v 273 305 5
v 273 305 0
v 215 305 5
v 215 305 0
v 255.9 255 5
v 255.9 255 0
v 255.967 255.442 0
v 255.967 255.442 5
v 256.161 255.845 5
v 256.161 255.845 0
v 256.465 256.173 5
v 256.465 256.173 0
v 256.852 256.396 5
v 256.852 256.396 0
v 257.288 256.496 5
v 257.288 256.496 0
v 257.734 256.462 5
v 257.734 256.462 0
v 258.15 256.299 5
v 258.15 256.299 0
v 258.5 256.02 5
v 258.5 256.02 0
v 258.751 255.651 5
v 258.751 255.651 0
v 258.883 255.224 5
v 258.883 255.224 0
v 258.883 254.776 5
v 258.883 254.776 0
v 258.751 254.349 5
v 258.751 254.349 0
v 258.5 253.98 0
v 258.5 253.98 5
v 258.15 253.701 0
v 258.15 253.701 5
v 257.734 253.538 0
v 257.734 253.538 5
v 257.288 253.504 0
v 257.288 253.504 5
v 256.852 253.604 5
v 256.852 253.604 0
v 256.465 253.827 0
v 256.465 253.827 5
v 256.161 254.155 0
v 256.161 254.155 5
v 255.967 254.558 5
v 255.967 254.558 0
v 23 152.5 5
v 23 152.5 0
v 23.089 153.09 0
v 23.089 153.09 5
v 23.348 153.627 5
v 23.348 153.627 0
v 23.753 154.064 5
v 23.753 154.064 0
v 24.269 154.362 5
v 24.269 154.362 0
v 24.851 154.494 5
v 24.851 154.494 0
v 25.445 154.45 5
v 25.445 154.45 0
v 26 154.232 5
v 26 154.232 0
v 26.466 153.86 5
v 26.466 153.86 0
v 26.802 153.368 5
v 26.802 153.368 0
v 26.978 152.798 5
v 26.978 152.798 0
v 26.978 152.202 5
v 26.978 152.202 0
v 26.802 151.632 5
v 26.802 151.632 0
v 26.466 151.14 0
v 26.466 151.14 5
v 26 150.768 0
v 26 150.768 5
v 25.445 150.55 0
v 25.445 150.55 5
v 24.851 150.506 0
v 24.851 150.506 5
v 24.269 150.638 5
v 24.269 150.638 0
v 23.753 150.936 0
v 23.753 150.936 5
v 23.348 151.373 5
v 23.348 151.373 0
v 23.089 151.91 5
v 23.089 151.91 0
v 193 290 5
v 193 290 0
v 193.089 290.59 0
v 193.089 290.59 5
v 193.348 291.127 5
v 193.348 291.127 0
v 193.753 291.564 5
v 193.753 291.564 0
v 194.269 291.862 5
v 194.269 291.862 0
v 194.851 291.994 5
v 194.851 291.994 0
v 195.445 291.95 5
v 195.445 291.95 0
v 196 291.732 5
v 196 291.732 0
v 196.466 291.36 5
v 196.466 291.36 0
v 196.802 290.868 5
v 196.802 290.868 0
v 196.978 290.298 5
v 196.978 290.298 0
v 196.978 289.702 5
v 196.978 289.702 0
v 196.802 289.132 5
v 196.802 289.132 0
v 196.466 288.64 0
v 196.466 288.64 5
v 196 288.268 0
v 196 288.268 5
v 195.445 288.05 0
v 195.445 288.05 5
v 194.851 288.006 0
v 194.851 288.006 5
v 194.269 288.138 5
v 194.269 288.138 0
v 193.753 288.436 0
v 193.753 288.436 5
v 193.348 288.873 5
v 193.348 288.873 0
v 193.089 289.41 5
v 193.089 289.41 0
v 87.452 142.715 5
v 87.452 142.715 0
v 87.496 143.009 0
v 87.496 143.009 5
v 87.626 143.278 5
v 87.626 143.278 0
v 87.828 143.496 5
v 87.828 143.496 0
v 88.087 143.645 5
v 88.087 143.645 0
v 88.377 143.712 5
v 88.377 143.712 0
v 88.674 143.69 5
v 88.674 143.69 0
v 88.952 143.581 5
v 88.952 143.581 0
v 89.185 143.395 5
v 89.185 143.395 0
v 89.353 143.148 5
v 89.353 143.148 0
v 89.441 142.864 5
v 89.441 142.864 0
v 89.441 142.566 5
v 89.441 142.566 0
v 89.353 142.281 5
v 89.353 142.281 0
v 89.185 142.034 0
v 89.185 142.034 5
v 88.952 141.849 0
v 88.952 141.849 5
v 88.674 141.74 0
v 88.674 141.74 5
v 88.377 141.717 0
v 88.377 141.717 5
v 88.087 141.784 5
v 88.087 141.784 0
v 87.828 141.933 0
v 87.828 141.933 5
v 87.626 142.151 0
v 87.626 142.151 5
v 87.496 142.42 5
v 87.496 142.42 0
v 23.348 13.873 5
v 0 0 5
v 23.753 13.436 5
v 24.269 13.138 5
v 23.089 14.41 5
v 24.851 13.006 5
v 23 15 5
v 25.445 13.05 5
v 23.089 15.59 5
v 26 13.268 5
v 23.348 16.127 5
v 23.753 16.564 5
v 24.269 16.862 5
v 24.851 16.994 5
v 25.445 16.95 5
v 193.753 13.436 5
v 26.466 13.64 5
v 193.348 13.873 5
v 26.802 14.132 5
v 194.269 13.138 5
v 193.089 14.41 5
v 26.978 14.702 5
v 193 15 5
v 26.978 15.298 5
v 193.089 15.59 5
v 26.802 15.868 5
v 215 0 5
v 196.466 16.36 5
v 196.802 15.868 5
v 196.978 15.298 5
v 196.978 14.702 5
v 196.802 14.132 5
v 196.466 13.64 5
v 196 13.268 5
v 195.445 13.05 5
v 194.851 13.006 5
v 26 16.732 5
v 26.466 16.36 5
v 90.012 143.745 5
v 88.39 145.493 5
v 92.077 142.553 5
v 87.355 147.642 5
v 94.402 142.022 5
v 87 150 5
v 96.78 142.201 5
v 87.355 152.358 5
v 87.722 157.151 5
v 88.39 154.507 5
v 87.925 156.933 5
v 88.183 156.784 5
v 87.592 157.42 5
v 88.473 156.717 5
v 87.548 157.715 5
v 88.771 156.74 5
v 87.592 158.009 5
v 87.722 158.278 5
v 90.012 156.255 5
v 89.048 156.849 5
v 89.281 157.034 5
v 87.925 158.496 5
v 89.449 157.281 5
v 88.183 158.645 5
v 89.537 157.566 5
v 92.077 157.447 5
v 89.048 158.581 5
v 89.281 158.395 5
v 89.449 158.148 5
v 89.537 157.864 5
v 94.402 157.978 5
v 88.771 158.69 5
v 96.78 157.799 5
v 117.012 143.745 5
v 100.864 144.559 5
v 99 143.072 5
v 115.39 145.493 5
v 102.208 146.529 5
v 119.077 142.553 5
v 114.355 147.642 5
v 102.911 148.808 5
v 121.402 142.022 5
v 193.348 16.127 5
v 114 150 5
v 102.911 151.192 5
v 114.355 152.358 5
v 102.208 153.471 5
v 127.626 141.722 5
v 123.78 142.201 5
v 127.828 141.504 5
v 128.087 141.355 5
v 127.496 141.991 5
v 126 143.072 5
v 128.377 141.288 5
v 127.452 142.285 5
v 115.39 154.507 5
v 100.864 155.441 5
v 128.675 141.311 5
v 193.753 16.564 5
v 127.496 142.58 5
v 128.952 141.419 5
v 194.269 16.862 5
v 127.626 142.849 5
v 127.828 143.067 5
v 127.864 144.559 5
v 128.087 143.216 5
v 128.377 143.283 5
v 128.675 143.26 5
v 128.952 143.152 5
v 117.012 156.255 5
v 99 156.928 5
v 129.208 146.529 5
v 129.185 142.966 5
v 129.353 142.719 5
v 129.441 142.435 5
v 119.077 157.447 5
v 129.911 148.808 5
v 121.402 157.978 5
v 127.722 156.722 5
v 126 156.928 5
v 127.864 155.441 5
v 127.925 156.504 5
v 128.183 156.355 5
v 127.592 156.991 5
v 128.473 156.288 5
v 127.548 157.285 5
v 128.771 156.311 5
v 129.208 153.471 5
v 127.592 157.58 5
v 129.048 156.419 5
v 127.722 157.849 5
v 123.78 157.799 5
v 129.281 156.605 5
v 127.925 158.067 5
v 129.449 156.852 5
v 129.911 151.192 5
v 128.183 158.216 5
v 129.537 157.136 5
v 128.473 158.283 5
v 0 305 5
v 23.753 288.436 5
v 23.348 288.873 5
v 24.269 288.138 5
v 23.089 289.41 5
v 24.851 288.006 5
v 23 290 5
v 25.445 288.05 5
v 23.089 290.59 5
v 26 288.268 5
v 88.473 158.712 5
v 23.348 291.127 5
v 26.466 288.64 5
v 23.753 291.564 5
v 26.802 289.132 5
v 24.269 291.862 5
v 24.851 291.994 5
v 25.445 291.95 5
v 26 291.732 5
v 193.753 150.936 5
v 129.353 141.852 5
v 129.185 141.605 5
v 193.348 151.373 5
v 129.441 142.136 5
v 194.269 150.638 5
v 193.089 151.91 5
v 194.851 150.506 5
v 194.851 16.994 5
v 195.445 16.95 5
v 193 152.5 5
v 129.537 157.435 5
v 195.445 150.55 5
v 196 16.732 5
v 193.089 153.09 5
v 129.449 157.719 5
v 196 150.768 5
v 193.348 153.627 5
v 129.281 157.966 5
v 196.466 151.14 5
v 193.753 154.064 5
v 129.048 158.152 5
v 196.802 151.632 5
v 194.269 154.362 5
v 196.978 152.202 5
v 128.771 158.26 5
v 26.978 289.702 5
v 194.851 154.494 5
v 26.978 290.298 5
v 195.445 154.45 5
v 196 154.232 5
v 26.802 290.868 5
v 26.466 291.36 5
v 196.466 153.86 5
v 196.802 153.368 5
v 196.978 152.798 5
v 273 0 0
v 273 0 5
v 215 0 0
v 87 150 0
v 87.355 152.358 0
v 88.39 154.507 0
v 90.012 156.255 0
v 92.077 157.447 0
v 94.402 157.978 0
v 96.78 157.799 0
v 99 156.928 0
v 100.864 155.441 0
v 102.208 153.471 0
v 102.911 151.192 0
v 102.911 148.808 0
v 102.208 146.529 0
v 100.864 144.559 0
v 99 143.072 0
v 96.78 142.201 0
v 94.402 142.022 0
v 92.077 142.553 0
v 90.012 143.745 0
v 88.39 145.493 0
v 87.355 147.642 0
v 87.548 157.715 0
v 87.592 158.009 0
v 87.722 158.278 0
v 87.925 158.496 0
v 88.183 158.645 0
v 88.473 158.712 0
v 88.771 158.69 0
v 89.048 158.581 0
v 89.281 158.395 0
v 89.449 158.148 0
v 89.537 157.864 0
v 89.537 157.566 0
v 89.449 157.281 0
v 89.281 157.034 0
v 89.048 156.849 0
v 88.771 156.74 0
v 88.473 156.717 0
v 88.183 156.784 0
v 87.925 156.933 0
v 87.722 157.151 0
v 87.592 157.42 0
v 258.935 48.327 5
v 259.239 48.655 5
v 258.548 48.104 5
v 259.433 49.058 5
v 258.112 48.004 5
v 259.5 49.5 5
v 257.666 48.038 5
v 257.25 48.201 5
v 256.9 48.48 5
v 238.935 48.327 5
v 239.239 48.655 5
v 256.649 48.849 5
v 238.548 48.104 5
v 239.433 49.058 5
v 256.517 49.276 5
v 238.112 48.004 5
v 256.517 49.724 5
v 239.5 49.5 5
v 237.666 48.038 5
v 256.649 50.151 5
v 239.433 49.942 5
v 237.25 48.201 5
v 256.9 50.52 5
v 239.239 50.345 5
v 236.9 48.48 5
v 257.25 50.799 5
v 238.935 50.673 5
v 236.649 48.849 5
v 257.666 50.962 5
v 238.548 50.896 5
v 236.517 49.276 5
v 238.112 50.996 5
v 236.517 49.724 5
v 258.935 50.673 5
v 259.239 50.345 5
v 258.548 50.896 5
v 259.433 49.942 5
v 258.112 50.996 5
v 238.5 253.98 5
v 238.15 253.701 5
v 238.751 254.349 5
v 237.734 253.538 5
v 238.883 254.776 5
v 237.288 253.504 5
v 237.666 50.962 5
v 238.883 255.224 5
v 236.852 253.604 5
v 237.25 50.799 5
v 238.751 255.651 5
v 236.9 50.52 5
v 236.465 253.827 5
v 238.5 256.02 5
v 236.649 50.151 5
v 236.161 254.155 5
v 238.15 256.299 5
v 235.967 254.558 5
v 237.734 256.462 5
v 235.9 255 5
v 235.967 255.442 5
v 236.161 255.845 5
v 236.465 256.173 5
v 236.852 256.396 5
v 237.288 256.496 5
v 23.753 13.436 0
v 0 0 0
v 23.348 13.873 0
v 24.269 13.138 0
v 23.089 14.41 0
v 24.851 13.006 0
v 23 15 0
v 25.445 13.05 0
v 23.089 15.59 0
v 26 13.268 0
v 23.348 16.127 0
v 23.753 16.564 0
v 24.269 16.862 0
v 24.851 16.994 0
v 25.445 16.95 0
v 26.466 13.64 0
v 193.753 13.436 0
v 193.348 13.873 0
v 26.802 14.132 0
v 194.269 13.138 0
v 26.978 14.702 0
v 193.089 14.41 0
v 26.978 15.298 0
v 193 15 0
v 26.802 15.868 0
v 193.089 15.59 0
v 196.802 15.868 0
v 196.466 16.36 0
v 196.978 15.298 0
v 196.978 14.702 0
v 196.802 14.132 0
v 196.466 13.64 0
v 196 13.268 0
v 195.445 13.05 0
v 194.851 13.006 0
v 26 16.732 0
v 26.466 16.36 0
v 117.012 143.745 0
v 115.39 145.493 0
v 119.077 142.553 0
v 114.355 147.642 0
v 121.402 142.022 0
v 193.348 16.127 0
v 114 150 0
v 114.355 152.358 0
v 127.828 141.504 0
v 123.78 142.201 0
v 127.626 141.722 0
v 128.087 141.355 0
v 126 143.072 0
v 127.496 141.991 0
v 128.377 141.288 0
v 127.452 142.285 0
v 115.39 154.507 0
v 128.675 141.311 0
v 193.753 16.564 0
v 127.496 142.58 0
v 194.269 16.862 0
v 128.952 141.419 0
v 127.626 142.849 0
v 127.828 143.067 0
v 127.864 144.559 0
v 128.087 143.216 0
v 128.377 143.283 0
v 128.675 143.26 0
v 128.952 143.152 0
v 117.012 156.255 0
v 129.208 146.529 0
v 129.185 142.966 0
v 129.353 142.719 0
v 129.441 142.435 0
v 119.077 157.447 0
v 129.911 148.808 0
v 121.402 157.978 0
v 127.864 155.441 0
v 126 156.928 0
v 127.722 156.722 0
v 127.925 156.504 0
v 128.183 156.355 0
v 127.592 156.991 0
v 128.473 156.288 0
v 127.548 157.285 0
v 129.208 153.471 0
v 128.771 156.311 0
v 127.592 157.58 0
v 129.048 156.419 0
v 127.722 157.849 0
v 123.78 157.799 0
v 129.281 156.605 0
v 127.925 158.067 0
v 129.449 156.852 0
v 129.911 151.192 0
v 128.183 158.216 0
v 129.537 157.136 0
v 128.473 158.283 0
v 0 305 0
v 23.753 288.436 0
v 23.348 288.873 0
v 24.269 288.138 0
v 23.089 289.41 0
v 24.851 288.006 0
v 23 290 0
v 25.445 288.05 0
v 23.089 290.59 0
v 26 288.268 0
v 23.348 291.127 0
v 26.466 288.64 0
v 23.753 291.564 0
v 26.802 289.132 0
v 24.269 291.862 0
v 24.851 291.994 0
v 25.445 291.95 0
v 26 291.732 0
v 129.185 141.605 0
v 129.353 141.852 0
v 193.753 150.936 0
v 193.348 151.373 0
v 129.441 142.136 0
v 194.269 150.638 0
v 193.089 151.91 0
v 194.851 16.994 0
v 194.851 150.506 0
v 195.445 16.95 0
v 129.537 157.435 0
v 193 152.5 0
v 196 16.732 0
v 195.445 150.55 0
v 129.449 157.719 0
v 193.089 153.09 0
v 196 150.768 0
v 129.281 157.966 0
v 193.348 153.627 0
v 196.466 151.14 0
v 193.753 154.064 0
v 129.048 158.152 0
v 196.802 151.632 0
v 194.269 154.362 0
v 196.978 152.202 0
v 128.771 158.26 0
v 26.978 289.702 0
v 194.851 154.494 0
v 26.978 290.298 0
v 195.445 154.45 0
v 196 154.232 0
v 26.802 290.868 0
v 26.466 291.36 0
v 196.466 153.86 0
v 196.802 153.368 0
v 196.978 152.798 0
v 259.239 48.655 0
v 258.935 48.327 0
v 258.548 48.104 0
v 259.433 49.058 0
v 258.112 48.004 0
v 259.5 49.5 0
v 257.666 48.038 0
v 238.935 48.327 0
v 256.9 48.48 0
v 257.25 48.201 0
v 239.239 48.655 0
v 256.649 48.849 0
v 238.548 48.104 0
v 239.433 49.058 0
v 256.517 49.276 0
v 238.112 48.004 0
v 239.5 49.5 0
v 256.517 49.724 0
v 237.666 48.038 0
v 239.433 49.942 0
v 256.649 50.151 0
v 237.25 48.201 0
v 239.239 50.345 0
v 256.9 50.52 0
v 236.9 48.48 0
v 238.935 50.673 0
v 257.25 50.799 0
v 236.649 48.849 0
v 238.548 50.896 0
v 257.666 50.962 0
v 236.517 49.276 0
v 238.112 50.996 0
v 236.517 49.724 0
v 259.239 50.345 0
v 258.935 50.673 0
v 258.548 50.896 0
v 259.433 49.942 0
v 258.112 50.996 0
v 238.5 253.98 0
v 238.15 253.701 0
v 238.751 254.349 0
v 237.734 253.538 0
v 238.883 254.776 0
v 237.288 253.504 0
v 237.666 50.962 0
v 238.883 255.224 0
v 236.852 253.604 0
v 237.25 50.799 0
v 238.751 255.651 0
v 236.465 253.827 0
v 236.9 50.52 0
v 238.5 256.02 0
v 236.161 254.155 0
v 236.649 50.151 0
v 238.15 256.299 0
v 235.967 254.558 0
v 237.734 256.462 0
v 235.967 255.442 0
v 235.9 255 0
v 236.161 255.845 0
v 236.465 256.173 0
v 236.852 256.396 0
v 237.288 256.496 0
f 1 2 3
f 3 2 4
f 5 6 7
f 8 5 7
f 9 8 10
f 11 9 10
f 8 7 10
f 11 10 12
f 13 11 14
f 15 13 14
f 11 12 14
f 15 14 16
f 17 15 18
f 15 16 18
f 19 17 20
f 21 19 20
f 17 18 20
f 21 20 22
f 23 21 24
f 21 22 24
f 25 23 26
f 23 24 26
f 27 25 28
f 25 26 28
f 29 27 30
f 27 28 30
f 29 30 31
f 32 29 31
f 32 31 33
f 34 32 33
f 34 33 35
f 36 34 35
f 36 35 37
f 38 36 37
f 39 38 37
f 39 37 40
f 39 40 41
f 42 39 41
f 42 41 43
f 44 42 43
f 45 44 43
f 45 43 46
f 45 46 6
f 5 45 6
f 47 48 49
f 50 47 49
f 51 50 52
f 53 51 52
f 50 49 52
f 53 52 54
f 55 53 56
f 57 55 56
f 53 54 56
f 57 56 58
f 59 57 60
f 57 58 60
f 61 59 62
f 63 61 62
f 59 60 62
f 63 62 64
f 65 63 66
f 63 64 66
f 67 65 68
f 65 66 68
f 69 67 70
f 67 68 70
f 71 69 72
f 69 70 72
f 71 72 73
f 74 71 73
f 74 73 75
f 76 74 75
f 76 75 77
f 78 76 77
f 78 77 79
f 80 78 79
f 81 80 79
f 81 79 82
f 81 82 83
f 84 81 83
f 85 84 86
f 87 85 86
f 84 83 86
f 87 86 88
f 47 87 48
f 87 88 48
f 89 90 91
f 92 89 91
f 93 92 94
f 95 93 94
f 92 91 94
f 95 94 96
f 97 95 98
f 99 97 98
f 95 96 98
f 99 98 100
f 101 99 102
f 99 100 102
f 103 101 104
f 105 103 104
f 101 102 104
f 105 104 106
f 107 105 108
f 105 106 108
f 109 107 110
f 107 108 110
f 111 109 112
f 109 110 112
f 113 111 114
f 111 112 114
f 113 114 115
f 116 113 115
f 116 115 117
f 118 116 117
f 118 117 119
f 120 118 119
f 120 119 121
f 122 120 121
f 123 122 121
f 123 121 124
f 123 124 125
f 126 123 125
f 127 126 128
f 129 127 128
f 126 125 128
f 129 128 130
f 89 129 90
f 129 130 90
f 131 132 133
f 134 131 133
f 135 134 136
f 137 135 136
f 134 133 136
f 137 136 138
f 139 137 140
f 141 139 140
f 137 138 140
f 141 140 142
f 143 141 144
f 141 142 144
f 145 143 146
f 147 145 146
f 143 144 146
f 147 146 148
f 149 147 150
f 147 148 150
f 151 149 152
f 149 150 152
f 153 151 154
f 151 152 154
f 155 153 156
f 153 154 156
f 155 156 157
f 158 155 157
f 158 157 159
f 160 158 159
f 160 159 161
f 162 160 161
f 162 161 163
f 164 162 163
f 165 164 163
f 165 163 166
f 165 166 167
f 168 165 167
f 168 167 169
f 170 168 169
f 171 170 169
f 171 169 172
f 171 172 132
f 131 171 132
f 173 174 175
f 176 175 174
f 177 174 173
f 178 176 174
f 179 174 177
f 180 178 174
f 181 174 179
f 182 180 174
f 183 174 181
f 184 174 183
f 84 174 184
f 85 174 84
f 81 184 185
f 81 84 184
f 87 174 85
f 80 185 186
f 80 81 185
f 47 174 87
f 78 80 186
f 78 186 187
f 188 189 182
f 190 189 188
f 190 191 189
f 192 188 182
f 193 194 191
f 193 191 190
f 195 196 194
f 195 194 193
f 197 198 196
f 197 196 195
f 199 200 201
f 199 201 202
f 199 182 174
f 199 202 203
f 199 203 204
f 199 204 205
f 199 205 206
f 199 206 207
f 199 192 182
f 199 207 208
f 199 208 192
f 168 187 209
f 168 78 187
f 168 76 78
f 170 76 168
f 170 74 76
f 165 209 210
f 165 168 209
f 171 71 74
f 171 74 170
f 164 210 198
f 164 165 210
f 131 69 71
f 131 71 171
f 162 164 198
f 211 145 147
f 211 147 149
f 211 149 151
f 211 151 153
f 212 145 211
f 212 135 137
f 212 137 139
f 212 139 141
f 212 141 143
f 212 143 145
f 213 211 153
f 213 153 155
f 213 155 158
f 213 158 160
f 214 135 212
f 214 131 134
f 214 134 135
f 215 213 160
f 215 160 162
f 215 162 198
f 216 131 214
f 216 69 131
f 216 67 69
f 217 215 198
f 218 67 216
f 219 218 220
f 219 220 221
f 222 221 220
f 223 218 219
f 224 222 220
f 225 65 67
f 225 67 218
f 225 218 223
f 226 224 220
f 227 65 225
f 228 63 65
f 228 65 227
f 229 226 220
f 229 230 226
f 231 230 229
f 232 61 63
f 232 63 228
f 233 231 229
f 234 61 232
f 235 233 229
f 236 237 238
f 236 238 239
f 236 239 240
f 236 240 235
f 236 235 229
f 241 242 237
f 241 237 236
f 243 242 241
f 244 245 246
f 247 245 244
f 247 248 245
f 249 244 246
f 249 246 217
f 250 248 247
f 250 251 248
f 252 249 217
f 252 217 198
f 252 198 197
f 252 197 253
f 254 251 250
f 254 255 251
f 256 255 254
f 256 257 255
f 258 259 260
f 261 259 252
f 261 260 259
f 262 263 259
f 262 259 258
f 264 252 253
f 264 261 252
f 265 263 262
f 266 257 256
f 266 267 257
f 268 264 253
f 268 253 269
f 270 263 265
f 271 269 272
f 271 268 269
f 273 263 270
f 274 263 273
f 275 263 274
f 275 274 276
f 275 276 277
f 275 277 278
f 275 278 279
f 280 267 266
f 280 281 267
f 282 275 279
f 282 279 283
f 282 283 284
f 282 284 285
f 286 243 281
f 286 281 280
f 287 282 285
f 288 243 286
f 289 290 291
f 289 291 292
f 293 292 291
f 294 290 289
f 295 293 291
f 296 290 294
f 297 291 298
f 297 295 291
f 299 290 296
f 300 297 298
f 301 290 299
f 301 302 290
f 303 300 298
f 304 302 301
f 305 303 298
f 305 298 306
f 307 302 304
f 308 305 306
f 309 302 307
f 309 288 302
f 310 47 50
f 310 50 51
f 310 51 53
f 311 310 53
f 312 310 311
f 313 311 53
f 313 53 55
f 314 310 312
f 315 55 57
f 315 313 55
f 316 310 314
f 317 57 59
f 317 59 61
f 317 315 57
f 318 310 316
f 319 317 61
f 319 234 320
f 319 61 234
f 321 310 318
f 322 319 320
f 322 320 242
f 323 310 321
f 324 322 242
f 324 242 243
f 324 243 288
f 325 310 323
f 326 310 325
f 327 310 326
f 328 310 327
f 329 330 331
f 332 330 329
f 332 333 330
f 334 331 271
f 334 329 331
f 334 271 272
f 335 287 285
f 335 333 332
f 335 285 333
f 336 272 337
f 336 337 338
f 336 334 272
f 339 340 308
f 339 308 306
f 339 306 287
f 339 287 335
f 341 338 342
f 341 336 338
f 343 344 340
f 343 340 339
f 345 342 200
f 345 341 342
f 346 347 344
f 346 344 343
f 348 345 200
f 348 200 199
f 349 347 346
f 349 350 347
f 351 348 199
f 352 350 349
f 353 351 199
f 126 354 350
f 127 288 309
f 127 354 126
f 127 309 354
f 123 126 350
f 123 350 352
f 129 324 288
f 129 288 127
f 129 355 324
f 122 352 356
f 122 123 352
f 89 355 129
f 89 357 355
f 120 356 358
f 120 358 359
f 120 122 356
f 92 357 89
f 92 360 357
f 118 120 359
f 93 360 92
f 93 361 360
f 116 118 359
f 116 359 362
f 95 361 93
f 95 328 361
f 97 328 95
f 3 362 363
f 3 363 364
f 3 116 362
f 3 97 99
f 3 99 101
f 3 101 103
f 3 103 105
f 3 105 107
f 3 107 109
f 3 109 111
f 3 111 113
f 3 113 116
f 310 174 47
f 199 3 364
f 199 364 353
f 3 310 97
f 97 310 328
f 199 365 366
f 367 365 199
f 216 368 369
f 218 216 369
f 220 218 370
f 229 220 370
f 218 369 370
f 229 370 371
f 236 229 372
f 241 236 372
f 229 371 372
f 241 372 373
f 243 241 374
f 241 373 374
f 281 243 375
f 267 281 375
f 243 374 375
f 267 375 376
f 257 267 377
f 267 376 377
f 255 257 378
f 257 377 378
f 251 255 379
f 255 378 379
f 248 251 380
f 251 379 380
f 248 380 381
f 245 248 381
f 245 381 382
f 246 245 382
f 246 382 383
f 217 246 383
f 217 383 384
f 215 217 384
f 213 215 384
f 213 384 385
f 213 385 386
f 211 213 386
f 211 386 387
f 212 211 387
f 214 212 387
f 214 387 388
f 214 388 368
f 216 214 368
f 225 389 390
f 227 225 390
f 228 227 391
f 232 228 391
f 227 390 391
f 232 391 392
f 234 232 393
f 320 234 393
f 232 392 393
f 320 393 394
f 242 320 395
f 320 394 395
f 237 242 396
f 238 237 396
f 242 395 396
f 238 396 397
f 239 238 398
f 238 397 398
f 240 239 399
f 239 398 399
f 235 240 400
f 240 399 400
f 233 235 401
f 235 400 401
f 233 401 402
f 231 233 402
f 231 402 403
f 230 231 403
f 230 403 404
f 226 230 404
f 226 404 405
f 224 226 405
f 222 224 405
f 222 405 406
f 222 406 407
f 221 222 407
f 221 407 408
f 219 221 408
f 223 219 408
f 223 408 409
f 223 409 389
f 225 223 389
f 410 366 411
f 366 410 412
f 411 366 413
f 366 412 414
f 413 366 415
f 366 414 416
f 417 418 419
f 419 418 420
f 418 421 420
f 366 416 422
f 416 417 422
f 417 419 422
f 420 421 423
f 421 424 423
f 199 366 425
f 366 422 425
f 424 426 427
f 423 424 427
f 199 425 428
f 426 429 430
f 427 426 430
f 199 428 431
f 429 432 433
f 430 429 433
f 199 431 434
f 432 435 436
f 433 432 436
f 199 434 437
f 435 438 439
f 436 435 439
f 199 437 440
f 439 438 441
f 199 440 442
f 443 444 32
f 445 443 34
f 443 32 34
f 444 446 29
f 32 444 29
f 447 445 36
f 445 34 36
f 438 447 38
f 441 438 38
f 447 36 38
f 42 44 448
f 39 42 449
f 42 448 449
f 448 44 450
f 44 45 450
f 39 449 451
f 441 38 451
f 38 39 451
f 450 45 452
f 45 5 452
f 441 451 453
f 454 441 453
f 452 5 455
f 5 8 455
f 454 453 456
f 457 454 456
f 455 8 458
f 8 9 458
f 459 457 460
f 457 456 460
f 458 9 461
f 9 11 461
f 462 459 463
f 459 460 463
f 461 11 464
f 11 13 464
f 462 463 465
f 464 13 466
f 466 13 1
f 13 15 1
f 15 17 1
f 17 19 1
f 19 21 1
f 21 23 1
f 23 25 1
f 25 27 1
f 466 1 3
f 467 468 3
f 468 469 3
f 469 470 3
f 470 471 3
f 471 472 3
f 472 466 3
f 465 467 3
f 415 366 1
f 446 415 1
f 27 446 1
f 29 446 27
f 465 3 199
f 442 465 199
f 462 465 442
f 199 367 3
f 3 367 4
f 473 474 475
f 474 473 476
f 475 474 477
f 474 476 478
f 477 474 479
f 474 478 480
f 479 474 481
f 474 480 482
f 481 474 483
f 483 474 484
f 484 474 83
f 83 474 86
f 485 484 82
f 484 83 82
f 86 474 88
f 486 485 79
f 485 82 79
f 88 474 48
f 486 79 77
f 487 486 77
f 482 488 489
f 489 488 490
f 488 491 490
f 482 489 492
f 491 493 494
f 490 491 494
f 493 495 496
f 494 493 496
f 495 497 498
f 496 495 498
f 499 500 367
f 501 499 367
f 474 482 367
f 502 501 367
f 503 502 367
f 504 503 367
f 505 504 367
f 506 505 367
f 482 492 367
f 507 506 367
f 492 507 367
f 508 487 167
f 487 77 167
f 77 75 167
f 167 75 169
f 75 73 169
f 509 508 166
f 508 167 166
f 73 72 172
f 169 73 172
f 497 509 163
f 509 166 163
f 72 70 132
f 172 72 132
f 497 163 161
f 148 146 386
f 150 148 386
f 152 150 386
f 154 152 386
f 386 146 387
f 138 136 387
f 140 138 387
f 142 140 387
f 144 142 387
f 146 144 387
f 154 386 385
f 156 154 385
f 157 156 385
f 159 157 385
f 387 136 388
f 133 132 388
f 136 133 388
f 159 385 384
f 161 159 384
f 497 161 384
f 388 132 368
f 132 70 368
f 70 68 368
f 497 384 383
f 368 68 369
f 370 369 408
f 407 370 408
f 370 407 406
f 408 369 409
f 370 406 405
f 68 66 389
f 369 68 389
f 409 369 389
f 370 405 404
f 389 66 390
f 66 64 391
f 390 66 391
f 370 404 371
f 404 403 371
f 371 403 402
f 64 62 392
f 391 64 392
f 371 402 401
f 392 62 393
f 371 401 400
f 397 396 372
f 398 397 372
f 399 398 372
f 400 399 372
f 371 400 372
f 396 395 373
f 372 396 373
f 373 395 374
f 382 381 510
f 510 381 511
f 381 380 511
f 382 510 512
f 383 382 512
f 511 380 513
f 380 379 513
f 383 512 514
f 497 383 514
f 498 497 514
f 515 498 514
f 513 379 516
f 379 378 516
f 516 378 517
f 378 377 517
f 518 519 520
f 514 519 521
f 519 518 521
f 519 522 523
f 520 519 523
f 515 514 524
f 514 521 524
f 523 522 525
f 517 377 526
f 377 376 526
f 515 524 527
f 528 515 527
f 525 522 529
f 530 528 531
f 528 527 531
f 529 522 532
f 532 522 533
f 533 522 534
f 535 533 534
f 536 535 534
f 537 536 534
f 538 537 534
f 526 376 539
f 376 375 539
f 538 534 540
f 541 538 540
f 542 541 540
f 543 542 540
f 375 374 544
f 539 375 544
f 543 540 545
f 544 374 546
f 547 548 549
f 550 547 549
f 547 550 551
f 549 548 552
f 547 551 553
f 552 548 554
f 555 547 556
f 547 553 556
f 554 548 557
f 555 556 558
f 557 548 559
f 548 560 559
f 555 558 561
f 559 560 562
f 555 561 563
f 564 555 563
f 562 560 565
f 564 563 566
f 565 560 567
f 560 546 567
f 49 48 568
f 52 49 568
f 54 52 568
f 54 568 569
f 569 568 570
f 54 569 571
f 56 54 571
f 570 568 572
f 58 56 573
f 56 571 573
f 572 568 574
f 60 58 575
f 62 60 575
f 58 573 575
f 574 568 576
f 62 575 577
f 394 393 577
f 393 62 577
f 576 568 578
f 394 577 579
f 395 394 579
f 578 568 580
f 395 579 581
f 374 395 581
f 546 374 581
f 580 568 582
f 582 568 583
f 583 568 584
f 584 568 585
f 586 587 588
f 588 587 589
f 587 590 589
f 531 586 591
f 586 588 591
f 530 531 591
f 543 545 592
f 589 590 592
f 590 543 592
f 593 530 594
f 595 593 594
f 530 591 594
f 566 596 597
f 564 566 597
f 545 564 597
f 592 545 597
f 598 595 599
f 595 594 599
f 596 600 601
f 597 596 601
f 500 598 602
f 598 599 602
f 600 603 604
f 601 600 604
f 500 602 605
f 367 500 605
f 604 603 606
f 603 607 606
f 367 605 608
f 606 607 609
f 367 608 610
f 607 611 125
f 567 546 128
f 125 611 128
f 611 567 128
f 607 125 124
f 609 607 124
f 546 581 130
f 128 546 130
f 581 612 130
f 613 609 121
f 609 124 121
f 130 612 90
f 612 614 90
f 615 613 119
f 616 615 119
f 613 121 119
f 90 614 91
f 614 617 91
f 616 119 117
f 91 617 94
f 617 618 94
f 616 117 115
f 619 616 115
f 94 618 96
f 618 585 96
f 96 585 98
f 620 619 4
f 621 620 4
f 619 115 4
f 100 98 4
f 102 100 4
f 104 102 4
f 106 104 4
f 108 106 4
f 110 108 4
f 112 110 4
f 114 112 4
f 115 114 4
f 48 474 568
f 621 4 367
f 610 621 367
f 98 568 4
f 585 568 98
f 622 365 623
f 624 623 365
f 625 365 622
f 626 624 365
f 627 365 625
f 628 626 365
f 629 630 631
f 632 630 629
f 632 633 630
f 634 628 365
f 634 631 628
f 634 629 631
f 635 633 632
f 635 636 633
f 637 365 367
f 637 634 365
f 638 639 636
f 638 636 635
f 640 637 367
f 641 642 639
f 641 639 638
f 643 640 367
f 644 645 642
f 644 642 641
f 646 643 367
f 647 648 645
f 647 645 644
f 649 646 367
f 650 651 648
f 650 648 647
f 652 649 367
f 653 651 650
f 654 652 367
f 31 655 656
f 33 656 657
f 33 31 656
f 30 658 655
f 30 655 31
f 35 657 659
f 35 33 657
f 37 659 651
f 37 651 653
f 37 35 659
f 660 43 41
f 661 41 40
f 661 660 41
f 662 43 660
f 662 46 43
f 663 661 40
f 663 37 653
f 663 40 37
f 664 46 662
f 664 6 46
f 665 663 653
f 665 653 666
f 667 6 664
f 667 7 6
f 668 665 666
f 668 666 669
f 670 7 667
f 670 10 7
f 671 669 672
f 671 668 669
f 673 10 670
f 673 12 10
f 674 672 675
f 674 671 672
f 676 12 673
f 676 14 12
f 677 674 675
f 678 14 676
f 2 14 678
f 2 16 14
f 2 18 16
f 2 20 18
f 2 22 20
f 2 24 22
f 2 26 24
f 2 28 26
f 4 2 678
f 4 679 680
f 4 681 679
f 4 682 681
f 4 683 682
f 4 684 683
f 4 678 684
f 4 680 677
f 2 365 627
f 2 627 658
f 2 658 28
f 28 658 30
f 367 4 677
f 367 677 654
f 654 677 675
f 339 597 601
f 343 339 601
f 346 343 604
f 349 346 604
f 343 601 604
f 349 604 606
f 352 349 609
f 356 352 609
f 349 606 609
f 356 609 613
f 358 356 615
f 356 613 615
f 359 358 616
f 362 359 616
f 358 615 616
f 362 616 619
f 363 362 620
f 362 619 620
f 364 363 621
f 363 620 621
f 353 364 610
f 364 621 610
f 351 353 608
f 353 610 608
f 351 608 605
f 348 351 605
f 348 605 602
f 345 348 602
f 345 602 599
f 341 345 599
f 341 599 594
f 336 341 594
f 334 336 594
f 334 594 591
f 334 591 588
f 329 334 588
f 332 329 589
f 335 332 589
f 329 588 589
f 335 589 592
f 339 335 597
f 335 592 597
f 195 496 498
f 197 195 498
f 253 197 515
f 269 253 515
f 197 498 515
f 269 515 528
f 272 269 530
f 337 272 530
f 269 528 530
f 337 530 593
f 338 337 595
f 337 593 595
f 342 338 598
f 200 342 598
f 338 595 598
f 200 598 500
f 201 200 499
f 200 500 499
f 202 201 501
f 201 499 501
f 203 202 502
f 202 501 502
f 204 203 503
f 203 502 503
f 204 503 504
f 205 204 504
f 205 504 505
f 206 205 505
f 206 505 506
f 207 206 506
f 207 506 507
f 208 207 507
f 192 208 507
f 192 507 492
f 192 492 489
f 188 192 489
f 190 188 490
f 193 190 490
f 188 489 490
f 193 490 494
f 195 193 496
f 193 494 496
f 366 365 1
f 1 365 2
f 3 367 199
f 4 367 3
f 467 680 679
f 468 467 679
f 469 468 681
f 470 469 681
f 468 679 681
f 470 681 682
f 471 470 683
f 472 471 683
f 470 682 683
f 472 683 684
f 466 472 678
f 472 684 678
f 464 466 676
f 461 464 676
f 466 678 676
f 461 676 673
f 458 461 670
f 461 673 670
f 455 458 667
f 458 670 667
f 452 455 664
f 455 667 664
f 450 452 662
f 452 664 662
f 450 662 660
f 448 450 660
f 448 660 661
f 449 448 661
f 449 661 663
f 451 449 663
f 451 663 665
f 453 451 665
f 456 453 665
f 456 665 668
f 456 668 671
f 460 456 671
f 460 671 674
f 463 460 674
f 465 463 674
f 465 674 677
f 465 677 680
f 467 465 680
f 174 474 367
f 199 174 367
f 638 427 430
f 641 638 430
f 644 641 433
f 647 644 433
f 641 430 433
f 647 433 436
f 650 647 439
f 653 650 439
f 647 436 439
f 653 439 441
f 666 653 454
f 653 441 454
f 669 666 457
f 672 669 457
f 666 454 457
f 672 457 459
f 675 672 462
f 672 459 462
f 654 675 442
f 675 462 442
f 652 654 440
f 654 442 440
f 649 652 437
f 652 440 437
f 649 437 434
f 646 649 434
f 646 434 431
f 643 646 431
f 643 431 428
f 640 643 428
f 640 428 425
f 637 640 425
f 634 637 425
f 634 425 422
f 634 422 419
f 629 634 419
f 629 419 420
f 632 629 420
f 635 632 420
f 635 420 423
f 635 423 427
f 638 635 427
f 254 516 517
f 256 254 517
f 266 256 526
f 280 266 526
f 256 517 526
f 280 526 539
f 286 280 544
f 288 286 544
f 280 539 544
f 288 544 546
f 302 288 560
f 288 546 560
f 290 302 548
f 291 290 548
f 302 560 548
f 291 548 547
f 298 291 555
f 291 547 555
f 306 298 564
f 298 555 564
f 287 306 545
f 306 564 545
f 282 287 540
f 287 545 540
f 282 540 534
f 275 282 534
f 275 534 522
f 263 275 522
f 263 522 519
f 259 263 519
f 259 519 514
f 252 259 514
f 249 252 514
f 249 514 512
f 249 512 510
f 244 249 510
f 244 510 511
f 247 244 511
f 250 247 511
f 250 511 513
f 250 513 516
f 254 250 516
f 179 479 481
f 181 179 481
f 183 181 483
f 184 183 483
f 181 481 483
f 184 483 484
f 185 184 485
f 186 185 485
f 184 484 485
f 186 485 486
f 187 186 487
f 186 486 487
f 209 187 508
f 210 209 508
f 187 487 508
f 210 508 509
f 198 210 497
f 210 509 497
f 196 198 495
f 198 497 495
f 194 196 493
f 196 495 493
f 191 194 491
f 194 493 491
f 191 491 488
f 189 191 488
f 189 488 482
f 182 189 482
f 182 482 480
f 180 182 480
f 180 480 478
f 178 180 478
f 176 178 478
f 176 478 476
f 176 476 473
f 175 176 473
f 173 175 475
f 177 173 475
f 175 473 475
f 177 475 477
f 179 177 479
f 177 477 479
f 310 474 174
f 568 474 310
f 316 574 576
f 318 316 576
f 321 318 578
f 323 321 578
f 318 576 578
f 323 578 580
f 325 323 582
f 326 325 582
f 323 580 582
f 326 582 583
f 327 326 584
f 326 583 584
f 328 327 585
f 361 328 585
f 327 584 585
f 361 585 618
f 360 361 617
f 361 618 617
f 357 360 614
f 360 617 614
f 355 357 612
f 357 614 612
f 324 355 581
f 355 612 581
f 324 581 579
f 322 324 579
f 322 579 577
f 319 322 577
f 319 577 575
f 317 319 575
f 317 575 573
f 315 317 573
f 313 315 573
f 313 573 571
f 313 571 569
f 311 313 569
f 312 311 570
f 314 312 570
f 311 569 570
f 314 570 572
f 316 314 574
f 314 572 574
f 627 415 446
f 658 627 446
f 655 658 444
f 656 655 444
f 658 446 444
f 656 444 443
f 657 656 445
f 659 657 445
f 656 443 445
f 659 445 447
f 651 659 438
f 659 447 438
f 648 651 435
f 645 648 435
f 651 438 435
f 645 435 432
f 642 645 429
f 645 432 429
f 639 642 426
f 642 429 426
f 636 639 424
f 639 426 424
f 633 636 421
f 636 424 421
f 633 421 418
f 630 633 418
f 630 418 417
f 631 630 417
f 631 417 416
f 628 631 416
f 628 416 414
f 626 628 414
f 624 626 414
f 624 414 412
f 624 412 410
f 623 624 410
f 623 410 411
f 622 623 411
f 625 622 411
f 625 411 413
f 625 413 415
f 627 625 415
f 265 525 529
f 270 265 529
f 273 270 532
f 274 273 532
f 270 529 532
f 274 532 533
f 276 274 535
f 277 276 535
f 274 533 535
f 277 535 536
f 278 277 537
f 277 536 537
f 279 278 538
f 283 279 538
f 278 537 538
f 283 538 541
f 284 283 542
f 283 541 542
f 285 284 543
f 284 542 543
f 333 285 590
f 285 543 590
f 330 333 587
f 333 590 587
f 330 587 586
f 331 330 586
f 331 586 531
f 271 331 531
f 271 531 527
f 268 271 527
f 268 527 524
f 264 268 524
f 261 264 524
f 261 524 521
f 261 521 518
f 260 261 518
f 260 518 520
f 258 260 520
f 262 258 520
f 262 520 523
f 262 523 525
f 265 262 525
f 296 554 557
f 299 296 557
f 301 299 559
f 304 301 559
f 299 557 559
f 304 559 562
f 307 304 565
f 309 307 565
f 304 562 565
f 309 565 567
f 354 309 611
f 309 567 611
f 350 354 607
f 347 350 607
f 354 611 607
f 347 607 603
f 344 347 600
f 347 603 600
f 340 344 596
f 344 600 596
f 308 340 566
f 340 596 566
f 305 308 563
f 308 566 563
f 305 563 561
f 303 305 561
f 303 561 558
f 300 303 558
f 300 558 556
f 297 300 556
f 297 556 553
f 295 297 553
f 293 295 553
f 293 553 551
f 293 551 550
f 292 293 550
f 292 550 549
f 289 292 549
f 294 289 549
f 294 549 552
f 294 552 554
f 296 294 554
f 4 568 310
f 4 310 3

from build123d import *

# Parameters (mm, degrees)
ESQUISSE1_W             = 215
ESQUISSE1_H             = 305
BOSS_EXTRU_1_DEPTH      = 5
ESQUISSE2_R             = 2
ENL_V_MAT_EXTRU_1_DEPTH = 5
ESQUISSE3_W             = 58
ESQUISSE3_H             = 305
BOSS_EXTRU_2_DEPTH      = 5
ESQUISSE4_R             = 1.5
ENL_V_MAT_EXTRU_3_DEPTH = 410.364141077
ESQUISSE5_R             = 1.5
ENL_V_MAT_EXTRU_4_DEPTH = 410.364141077
ESQUISSE6_R             = 8
ENL_V_MAT_EXTRU_5_DEPTH = 410.364141077
ESQUISSE7_R             = 1
ENL_V_MAT_EXTRU_7_DEPTH = 410.364141077


with BuildPart() as part:
    # Esquisse1 → Boss.-Extru.1 (new body)
    with BuildSketch(Plane.XY):
        with Locations((107.5, 152.5)):
            Rectangle(ESQUISSE1_W, ESQUISSE1_H)
    extrude(amount=BOSS_EXTRU_1_DEPTH)

    # Esquisse2 → Enlèv. mat.-Extru.1 (cut)
    with BuildSketch(Plane(origin=(0, 0, 0), x_dir=(-1, 0, 0), z_dir=(0, 0, -1))):
        with Locations((-195, 290)):
            Circle(ESQUISSE2_R)
        with Locations((-25, 290)):
            Circle(ESQUISSE2_R)
        with Locations((-25, 15)):
            Circle(ESQUISSE2_R)
        with Locations((-195, 15)):
            Circle(ESQUISSE2_R)
        with Locations((-195, 152.5)):
            Circle(ESQUISSE2_R)
        with Locations((-25, 152.5)):
            Circle(ESQUISSE2_R)
    extrude(amount=-ENL_V_MAT_EXTRU_1_DEPTH, mode=Mode.SUBTRACT)

    # Esquisse6 → Enlèv. mat.-Extru.5 (cut, through all)
    with BuildSketch(Plane(origin=(0, 0, 0), x_dir=(-1, 0, 0), z_dir=(0, 0, -1))):
        with Locations((-122, 150)):
            Circle(ESQUISSE6_R)
        with Locations((-95, 150)):
            Circle(ESQUISSE6_R)
    extrude(amount=-ENL_V_MAT_EXTRU_5_DEPTH, mode=Mode.SUBTRACT)

    # Esquisse7 → Enlèv. mat.-Extru.7 (cut, through all)
    with BuildSketch(Plane(origin=(0, 0, 0), x_dir=(-1, 0, 0), z_dir=(0, 0, -1))):
        with Locations((-128.548036325, 157.285475877)):
            Circle(ESQUISSE7_R)
        with Locations((-128.451980772, 142.285475877)):
            Circle(ESQUISSE7_R)
        with Locations((-88.548036325, 157.714598257)):
            Circle(ESQUISSE7_R)
        with Locations((-88.451947576, 142.714598257)):
            Circle(ESQUISSE7_R)
    extrude(amount=-ENL_V_MAT_EXTRU_7_DEPTH, mode=Mode.SUBTRACT)


with BuildPart() as body_2:
    # Esquisse3 → Boss.-Extru.2 (new body)
    with BuildSketch(Plane(origin=(0, 0, 0), x_dir=(-1, 0, 0), z_dir=(0, 0, -1))):
        with Locations((-244, 152.5)):
            Rectangle(ESQUISSE3_W, ESQUISSE3_H)
    extrude(amount=-BOSS_EXTRU_2_DEPTH)

    # Esquisse4 → Enlèv. mat.-Extru.3 (cut, through all)
    with BuildSketch(Plane(origin=(0, 0, 0), x_dir=(-1, 0, 0), z_dir=(0, 0, -1))):
        with Locations((-237.4, 255)):
            Circle(ESQUISSE4_R)
        with Locations((-257.4, 255)):
            Circle(ESQUISSE4_R)
    extrude(amount=-ENL_V_MAT_EXTRU_3_DEPTH, mode=Mode.SUBTRACT)

    # Esquisse5 → Enlèv. mat.-Extru.4 (cut, through all)
    with BuildSketch(Plane.XY.offset(5)):
        with Locations((238, 49.5)):
            Circle(ESQUISSE5_R)
        with Locations((258, 49.5)):
            Circle(ESQUISSE5_R)
    extrude(amount=-ENL_V_MAT_EXTRU_4_DEPTH, mode=Mode.SUBTRACT)


solid = Compound([part.part, body_2.part])
